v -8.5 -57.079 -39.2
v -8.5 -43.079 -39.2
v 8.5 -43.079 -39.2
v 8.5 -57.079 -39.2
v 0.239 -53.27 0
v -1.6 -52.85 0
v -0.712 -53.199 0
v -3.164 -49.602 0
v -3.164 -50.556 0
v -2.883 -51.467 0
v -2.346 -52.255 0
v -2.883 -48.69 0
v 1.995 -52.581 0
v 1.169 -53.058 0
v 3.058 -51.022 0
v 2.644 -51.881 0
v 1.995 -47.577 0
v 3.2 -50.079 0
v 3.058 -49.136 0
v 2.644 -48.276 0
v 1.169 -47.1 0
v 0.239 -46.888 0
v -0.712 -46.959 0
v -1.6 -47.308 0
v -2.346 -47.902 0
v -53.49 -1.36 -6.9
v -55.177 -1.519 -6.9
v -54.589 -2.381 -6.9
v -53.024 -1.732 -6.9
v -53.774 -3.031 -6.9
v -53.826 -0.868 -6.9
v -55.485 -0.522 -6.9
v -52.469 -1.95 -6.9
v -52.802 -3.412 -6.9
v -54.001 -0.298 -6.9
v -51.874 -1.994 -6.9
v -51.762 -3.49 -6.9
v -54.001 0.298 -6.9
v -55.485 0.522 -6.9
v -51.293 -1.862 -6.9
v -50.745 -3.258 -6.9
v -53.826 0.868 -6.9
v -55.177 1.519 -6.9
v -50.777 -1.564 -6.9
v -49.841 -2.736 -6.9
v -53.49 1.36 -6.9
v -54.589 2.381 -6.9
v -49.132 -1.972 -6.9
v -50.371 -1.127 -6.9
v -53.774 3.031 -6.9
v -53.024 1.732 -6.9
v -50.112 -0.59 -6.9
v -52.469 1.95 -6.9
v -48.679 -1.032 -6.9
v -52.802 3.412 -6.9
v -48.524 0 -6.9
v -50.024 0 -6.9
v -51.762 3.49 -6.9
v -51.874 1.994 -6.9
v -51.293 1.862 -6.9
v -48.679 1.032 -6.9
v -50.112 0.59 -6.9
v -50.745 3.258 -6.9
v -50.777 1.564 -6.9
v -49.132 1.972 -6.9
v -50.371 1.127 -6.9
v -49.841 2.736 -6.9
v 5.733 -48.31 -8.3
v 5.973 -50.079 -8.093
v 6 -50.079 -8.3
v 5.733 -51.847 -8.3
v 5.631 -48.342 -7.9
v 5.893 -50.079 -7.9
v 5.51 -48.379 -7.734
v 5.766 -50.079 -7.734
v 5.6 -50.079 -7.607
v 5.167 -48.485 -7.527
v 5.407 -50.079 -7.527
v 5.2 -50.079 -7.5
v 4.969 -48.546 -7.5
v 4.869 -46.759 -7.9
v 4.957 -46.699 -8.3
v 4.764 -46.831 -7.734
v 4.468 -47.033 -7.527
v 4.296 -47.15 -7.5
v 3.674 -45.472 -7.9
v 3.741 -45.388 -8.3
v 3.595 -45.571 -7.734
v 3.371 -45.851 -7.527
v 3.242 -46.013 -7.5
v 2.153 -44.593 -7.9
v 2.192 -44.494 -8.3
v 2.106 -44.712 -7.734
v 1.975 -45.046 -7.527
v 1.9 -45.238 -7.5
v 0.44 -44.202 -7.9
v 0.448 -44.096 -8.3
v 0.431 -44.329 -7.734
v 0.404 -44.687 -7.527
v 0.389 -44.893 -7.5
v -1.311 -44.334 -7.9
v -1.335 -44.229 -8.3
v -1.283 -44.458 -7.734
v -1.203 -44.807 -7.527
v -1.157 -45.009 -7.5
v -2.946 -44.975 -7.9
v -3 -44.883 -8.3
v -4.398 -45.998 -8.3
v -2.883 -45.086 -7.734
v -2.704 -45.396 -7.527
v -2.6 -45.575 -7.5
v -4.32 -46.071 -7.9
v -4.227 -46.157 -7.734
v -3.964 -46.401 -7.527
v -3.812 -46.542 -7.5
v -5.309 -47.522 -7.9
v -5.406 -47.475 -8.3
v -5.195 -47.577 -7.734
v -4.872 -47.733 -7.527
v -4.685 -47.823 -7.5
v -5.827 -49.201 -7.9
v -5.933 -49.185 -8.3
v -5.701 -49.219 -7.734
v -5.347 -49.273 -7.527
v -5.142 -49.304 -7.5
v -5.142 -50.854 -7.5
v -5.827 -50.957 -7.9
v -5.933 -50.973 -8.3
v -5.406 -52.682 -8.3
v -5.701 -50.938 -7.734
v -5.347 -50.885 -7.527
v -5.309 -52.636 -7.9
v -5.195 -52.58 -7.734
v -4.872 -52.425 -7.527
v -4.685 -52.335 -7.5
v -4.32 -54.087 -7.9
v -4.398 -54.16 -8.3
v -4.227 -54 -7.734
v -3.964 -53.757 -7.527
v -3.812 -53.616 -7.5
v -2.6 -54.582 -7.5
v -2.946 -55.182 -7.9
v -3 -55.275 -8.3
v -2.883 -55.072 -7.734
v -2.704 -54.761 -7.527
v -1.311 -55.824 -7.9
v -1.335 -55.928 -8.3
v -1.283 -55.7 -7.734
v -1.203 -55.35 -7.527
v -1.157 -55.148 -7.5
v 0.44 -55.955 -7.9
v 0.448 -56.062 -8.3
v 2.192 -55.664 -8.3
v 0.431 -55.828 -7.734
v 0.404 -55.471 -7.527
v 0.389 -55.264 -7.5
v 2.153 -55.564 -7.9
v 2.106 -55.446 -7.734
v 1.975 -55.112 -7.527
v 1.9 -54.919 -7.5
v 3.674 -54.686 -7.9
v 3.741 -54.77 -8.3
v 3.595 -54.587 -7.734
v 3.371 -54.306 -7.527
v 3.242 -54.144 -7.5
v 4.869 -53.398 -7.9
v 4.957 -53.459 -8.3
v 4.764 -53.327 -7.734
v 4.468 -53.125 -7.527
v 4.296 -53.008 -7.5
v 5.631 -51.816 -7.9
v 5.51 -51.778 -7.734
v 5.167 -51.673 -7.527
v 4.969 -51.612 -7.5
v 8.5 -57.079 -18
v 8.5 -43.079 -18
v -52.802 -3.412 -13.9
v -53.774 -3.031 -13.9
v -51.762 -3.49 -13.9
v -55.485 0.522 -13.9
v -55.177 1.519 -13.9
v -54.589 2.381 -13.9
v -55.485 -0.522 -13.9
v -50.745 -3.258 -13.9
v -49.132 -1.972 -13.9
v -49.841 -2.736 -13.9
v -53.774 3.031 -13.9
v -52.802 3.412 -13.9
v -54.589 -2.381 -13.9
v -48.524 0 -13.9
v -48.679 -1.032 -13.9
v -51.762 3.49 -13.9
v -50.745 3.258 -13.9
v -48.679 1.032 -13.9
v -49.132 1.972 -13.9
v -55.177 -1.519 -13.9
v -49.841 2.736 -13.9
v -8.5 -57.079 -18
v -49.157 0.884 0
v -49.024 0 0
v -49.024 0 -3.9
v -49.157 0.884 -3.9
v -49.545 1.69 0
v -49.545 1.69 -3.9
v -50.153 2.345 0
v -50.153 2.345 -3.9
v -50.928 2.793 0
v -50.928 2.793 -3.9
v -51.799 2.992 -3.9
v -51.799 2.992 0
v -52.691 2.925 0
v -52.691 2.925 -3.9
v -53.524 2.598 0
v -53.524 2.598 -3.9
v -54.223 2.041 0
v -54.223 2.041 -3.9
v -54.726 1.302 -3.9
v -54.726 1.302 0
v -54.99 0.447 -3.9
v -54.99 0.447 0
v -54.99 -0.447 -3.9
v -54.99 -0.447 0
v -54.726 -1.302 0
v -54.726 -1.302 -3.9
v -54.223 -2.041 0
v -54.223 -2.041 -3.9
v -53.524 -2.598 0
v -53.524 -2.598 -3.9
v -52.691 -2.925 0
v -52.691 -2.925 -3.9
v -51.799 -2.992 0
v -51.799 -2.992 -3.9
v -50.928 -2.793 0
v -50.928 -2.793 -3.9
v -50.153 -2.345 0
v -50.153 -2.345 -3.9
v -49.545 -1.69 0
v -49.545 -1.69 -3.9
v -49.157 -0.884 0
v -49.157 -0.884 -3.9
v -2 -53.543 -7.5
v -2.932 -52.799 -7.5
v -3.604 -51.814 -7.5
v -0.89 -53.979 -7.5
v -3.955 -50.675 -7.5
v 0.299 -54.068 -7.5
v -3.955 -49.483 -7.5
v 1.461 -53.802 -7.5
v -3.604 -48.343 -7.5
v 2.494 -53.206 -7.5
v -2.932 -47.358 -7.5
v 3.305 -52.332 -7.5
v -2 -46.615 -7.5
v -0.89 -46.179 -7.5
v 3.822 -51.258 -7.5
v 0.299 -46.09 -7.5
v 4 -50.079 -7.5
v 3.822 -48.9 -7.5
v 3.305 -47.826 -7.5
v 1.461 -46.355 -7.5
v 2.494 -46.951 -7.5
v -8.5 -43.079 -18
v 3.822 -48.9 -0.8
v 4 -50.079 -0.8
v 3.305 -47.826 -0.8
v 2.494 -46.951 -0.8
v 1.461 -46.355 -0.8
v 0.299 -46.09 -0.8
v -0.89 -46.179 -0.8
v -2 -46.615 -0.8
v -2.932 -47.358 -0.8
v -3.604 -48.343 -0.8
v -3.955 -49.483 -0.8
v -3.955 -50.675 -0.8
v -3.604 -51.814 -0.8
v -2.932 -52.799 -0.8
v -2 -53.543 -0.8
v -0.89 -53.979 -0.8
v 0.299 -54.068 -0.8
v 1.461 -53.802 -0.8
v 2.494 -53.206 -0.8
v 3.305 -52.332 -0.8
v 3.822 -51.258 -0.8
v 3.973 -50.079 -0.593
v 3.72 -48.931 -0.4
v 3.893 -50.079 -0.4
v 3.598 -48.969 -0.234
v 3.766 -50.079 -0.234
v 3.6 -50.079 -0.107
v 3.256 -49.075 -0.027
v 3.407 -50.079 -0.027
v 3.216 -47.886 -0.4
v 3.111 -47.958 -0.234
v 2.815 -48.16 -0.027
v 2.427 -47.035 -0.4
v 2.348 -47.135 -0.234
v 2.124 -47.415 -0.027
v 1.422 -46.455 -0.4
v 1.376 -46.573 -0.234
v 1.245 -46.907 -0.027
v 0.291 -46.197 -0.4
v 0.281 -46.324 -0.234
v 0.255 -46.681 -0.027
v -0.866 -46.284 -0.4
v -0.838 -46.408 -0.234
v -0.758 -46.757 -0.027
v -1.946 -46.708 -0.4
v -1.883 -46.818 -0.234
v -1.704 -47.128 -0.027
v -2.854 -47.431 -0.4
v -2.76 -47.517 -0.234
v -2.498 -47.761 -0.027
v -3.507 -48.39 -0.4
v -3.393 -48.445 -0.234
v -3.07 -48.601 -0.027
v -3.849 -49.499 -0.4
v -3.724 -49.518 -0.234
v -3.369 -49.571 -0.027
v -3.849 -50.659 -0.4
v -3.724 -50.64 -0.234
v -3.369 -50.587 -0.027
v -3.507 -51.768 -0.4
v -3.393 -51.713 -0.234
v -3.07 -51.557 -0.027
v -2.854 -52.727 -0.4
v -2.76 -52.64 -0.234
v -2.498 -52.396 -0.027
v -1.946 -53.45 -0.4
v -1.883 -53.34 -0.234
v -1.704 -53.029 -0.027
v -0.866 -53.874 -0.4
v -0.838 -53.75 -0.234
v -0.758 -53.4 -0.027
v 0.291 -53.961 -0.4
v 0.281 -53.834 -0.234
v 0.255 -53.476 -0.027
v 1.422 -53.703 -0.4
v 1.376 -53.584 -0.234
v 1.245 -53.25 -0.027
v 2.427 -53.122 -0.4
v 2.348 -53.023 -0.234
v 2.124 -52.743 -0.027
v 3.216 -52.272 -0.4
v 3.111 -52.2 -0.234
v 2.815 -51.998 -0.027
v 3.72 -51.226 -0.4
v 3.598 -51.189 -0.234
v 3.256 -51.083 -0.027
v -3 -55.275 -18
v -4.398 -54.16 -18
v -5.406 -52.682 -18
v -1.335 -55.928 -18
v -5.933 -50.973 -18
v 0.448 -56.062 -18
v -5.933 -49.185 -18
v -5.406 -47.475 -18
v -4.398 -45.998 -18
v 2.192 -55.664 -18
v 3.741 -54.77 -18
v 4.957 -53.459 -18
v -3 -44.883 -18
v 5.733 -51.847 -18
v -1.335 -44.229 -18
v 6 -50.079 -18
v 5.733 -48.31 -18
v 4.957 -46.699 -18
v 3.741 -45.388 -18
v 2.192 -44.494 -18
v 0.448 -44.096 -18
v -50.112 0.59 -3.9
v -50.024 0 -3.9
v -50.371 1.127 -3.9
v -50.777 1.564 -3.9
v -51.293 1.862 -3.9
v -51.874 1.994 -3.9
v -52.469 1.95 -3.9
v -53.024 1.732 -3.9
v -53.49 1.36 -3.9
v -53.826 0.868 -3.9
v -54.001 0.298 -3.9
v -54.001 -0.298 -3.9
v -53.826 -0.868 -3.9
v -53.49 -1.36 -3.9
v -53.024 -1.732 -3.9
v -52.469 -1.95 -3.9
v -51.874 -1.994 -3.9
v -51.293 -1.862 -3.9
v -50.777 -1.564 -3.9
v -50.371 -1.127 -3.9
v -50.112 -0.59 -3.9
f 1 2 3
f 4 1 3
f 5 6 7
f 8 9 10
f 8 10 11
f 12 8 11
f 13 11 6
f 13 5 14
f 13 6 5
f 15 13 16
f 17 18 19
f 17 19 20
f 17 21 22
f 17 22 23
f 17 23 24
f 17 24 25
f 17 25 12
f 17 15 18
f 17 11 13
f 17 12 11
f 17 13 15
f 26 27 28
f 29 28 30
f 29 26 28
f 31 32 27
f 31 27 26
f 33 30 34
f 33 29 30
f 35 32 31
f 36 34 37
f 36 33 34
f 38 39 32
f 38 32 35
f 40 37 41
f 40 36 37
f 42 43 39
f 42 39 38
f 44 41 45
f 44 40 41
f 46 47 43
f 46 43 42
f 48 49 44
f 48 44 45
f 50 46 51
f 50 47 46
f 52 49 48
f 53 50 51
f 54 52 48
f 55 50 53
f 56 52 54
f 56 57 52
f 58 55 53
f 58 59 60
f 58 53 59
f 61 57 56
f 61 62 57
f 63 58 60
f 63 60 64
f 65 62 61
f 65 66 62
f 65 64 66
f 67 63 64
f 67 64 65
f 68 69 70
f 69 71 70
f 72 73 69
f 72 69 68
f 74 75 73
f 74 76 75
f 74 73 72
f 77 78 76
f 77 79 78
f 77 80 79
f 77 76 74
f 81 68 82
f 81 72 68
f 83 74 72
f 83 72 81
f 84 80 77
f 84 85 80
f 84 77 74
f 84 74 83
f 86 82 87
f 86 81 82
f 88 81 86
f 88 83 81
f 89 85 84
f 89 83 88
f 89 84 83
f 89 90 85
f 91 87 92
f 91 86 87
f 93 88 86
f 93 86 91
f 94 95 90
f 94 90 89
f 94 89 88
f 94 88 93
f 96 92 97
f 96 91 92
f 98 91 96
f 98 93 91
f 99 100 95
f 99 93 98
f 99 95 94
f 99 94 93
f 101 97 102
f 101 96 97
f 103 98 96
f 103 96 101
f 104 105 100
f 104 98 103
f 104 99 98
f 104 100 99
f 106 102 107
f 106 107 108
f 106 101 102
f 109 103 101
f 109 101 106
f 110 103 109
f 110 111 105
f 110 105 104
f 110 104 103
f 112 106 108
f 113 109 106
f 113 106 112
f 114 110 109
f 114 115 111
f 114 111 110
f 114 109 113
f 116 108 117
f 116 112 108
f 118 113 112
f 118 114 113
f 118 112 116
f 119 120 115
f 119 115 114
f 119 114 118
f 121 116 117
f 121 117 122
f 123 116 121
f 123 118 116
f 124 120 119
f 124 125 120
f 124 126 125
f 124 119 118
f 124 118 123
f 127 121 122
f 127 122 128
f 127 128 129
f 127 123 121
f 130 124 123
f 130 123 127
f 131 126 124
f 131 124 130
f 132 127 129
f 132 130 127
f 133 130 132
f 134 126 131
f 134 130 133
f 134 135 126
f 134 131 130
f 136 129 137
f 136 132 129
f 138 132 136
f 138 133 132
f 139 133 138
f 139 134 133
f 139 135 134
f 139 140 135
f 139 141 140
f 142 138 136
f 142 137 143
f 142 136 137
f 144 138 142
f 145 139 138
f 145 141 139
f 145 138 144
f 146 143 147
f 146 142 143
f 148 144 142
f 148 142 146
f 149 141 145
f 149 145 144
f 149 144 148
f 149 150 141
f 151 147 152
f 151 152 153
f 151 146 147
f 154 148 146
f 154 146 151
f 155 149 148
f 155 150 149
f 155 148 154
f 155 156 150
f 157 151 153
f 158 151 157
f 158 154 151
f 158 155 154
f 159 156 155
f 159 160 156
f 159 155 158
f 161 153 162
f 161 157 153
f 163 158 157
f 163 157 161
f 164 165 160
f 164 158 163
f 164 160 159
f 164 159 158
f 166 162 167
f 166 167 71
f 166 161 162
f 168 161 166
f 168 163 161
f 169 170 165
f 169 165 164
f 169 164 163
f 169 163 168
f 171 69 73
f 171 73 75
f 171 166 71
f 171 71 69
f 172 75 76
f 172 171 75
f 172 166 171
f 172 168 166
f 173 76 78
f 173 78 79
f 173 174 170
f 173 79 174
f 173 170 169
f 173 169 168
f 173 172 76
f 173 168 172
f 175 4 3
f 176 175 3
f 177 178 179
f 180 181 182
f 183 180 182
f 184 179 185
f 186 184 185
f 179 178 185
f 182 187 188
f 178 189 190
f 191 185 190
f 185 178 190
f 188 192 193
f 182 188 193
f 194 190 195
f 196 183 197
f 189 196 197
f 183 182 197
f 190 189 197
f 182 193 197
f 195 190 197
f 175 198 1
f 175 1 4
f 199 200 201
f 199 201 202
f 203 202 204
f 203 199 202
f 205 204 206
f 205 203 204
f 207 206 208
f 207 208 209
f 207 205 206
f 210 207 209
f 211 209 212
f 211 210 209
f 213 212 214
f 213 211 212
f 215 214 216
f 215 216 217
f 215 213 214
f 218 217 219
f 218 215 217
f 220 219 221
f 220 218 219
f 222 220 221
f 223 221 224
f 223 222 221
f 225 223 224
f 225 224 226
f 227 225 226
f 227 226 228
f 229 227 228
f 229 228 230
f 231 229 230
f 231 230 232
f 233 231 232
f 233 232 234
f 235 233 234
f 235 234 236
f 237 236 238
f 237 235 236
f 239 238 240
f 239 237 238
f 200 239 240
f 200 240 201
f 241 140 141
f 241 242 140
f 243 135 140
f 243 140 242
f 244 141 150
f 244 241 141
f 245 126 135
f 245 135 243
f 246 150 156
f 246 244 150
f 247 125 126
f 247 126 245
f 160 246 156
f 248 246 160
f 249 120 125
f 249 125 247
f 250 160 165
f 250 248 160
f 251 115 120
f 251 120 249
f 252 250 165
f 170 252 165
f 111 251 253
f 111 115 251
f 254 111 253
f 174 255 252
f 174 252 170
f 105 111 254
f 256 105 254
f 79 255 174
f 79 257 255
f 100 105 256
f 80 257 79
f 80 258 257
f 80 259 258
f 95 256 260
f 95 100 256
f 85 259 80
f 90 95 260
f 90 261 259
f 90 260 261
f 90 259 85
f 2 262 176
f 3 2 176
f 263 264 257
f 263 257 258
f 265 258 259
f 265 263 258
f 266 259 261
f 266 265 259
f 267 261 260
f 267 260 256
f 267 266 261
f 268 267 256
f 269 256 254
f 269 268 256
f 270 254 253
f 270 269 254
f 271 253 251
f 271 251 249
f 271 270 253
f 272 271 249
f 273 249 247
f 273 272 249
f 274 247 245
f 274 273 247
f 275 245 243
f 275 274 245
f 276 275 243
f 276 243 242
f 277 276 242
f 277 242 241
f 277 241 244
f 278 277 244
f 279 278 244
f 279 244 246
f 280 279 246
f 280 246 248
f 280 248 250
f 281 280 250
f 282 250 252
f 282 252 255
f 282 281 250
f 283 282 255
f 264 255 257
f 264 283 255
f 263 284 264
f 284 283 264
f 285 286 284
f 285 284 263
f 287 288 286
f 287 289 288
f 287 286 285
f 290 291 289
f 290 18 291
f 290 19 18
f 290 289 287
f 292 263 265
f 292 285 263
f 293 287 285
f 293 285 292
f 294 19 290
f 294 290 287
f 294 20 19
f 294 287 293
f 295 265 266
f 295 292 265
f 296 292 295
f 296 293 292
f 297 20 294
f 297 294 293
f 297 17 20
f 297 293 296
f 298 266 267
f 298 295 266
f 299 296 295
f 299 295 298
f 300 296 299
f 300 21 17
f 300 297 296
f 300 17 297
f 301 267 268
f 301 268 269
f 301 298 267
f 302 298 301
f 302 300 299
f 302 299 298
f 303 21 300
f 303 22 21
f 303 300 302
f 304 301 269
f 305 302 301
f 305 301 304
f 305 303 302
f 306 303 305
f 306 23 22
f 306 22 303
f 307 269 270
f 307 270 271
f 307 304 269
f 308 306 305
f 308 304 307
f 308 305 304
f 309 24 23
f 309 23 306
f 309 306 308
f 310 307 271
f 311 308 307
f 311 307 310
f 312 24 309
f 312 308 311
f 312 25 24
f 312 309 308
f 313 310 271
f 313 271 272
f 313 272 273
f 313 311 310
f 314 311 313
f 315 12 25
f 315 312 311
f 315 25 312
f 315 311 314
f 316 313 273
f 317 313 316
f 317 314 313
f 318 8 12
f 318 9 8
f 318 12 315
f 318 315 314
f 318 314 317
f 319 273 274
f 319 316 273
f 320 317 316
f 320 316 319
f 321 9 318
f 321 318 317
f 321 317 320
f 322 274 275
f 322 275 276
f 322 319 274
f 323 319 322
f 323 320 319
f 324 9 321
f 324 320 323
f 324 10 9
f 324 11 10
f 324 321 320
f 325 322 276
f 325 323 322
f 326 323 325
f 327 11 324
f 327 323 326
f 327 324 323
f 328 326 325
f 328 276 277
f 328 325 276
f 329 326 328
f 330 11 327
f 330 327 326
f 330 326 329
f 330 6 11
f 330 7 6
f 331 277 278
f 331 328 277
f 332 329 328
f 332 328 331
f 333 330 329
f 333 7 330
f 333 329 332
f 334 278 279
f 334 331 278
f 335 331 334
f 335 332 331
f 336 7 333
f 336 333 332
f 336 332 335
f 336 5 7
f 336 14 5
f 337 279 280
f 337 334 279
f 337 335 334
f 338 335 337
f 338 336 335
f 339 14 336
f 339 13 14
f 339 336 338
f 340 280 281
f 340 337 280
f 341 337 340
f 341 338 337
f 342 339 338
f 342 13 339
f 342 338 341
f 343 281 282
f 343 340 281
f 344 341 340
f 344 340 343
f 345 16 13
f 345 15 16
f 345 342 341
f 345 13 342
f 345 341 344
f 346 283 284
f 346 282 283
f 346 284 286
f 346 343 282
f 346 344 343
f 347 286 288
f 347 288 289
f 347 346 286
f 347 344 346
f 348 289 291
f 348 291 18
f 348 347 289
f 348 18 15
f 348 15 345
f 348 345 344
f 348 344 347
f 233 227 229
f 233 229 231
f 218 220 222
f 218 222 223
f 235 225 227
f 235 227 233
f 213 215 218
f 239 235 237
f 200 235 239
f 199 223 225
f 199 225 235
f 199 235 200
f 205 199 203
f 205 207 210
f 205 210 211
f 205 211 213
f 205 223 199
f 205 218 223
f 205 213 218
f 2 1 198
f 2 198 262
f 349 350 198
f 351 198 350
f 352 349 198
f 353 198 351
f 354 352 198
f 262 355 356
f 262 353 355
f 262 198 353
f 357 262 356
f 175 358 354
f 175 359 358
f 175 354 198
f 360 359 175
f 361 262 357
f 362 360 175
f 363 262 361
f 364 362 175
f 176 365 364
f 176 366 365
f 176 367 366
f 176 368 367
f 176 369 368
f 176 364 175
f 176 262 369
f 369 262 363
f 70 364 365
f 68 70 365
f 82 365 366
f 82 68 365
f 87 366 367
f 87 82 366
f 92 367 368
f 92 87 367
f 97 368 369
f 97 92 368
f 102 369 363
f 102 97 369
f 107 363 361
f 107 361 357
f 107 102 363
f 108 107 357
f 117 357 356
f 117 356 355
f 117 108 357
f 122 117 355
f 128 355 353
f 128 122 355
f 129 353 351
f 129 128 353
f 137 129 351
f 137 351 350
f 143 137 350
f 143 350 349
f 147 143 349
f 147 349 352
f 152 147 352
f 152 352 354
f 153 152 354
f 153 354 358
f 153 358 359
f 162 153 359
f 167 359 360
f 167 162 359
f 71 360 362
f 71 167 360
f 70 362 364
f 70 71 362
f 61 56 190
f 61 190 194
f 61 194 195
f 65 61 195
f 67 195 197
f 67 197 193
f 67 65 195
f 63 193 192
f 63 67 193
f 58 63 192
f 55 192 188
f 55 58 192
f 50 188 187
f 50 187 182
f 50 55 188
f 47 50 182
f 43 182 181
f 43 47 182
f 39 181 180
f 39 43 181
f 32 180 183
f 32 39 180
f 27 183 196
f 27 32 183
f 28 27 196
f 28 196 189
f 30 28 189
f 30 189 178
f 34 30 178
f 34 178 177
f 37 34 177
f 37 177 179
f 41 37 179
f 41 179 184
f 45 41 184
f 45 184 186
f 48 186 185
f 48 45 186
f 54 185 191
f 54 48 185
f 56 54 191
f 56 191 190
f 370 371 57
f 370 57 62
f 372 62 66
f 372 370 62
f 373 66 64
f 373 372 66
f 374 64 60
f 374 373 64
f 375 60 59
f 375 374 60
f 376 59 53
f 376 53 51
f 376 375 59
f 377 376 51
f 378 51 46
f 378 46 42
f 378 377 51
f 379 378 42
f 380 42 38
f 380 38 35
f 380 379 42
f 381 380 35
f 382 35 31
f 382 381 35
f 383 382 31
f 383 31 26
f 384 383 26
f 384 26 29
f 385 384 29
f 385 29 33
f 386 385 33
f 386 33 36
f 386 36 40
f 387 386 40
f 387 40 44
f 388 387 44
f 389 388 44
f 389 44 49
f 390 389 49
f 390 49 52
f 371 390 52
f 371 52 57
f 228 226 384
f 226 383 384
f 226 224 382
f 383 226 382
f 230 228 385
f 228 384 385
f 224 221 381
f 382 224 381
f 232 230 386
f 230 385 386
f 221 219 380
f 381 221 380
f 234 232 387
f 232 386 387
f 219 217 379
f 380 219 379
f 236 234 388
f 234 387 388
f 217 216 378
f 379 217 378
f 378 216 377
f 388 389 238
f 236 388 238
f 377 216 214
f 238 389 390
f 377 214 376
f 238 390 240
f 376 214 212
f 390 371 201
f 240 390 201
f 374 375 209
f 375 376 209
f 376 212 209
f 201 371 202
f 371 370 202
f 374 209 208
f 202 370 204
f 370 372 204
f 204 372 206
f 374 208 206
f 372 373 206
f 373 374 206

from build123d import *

# Parameters (mm, degrees)
F0_R     = 3
F0_R_2   = 2
F1_DEPTH = 3.9
F2_DEPTH = 6.9
F3_START = -6.9
F0_R_3   = 3.5
F3_DEPTH = 7
F4_R     = 4
F5_DEPTH = 7.5
F6_START = -7.5
F4_R_2   = 6
F6_DEPTH = 10.5
F7_START = -18
F4_W     = 17
F4_H     = 14
F7_DEPTH = 21.2
F8_R     = 0.8


with BuildPart() as f1:
    # F0 (on Top) → F1 (new body)
    with BuildSketch(Plane.XY):
        with Locations((-52.0235921488, 0)):
            Circle(F0_R)
        with Locations((-52.0235921488, 0)):
            Circle(F0_R_2, mode=Mode.SUBTRACT)
        with Locations((-52.0235921488, 0)):
            Circle(F0_R_2)
    extrude(amount=-F1_DEPTH)

    # F0 (on Top) → F2 (join)
    with BuildSketch(Plane.XY):
        with Locations((-52.0235921488, 0)):
            Circle(F0_R_2)
    extrude(amount=-F2_DEPTH)

    # F0 (on Top) → F3 (join)
    with BuildSketch(Plane.XY.offset(F3_START)):
        with Locations((-52.0235921488, 0)):
            Circle(F0_R_3)
        with Locations((-52.0235921488, 0)):
            Circle(F0_R, mode=Mode.SUBTRACT)
        with Locations((-52.0235921488, 0)):
            Circle(F0_R)
        with Locations((-52.0235921488, 0)):
            Circle(F0_R_2, mode=Mode.SUBTRACT)
        with Locations((-52.0235921488, 0)):
            Circle(F0_R_2)
    extrude(amount=-F3_DEPTH)


with BuildPart() as f5:
    # F4 (on Top) → F5 (new body)
    with BuildSketch(Plane.XY):
        with Locations((0, -50.0788018107)):
            Circle(F4_R)
    extrude(amount=-F5_DEPTH)

    # F4 (on Top) → F6 (join)
    with BuildSketch(Plane.XY.offset(F6_START)):
        with Locations((0, -50.0788018107)):
            Circle(F4_R_2)
        with Locations((0, -50.0788018107)):
            Circle(F4_R, mode=Mode.SUBTRACT)
        with Locations((0, -50.0788018107)):
            Circle(F4_R)
    extrude(amount=-F6_DEPTH)

    # F4 (on Top) → F7 (join)
    with BuildSketch(Plane.XY.offset(F7_START)):
        with Locations((0, -50.0788018107)):
            Rectangle(F4_W, F4_H)
        with Locations((0, -50.0788018107)):
            Circle(F4_R_2, mode=Mode.SUBTRACT)
        with Locations((0, -50.0788018107)):
            Circle(F4_R_2)
        with Locations((0, -50.0788018107)):
            Circle(F4_R, mode=Mode.SUBTRACT)
        with Locations((0, -50.0788018107)):
            Circle(F4_R)
    extrude(amount=-F7_DEPTH)

    # F8
    f8_edges = [f5.edges().sort_by_distance(p)[0] for p in [
        (-6, -50.078802, -7.5),
        (-4, -50.078802, 0),
    ]]
    fillet(f8_edges, radius=F8_R)


solid = Compound([f1.part, f5.part])
